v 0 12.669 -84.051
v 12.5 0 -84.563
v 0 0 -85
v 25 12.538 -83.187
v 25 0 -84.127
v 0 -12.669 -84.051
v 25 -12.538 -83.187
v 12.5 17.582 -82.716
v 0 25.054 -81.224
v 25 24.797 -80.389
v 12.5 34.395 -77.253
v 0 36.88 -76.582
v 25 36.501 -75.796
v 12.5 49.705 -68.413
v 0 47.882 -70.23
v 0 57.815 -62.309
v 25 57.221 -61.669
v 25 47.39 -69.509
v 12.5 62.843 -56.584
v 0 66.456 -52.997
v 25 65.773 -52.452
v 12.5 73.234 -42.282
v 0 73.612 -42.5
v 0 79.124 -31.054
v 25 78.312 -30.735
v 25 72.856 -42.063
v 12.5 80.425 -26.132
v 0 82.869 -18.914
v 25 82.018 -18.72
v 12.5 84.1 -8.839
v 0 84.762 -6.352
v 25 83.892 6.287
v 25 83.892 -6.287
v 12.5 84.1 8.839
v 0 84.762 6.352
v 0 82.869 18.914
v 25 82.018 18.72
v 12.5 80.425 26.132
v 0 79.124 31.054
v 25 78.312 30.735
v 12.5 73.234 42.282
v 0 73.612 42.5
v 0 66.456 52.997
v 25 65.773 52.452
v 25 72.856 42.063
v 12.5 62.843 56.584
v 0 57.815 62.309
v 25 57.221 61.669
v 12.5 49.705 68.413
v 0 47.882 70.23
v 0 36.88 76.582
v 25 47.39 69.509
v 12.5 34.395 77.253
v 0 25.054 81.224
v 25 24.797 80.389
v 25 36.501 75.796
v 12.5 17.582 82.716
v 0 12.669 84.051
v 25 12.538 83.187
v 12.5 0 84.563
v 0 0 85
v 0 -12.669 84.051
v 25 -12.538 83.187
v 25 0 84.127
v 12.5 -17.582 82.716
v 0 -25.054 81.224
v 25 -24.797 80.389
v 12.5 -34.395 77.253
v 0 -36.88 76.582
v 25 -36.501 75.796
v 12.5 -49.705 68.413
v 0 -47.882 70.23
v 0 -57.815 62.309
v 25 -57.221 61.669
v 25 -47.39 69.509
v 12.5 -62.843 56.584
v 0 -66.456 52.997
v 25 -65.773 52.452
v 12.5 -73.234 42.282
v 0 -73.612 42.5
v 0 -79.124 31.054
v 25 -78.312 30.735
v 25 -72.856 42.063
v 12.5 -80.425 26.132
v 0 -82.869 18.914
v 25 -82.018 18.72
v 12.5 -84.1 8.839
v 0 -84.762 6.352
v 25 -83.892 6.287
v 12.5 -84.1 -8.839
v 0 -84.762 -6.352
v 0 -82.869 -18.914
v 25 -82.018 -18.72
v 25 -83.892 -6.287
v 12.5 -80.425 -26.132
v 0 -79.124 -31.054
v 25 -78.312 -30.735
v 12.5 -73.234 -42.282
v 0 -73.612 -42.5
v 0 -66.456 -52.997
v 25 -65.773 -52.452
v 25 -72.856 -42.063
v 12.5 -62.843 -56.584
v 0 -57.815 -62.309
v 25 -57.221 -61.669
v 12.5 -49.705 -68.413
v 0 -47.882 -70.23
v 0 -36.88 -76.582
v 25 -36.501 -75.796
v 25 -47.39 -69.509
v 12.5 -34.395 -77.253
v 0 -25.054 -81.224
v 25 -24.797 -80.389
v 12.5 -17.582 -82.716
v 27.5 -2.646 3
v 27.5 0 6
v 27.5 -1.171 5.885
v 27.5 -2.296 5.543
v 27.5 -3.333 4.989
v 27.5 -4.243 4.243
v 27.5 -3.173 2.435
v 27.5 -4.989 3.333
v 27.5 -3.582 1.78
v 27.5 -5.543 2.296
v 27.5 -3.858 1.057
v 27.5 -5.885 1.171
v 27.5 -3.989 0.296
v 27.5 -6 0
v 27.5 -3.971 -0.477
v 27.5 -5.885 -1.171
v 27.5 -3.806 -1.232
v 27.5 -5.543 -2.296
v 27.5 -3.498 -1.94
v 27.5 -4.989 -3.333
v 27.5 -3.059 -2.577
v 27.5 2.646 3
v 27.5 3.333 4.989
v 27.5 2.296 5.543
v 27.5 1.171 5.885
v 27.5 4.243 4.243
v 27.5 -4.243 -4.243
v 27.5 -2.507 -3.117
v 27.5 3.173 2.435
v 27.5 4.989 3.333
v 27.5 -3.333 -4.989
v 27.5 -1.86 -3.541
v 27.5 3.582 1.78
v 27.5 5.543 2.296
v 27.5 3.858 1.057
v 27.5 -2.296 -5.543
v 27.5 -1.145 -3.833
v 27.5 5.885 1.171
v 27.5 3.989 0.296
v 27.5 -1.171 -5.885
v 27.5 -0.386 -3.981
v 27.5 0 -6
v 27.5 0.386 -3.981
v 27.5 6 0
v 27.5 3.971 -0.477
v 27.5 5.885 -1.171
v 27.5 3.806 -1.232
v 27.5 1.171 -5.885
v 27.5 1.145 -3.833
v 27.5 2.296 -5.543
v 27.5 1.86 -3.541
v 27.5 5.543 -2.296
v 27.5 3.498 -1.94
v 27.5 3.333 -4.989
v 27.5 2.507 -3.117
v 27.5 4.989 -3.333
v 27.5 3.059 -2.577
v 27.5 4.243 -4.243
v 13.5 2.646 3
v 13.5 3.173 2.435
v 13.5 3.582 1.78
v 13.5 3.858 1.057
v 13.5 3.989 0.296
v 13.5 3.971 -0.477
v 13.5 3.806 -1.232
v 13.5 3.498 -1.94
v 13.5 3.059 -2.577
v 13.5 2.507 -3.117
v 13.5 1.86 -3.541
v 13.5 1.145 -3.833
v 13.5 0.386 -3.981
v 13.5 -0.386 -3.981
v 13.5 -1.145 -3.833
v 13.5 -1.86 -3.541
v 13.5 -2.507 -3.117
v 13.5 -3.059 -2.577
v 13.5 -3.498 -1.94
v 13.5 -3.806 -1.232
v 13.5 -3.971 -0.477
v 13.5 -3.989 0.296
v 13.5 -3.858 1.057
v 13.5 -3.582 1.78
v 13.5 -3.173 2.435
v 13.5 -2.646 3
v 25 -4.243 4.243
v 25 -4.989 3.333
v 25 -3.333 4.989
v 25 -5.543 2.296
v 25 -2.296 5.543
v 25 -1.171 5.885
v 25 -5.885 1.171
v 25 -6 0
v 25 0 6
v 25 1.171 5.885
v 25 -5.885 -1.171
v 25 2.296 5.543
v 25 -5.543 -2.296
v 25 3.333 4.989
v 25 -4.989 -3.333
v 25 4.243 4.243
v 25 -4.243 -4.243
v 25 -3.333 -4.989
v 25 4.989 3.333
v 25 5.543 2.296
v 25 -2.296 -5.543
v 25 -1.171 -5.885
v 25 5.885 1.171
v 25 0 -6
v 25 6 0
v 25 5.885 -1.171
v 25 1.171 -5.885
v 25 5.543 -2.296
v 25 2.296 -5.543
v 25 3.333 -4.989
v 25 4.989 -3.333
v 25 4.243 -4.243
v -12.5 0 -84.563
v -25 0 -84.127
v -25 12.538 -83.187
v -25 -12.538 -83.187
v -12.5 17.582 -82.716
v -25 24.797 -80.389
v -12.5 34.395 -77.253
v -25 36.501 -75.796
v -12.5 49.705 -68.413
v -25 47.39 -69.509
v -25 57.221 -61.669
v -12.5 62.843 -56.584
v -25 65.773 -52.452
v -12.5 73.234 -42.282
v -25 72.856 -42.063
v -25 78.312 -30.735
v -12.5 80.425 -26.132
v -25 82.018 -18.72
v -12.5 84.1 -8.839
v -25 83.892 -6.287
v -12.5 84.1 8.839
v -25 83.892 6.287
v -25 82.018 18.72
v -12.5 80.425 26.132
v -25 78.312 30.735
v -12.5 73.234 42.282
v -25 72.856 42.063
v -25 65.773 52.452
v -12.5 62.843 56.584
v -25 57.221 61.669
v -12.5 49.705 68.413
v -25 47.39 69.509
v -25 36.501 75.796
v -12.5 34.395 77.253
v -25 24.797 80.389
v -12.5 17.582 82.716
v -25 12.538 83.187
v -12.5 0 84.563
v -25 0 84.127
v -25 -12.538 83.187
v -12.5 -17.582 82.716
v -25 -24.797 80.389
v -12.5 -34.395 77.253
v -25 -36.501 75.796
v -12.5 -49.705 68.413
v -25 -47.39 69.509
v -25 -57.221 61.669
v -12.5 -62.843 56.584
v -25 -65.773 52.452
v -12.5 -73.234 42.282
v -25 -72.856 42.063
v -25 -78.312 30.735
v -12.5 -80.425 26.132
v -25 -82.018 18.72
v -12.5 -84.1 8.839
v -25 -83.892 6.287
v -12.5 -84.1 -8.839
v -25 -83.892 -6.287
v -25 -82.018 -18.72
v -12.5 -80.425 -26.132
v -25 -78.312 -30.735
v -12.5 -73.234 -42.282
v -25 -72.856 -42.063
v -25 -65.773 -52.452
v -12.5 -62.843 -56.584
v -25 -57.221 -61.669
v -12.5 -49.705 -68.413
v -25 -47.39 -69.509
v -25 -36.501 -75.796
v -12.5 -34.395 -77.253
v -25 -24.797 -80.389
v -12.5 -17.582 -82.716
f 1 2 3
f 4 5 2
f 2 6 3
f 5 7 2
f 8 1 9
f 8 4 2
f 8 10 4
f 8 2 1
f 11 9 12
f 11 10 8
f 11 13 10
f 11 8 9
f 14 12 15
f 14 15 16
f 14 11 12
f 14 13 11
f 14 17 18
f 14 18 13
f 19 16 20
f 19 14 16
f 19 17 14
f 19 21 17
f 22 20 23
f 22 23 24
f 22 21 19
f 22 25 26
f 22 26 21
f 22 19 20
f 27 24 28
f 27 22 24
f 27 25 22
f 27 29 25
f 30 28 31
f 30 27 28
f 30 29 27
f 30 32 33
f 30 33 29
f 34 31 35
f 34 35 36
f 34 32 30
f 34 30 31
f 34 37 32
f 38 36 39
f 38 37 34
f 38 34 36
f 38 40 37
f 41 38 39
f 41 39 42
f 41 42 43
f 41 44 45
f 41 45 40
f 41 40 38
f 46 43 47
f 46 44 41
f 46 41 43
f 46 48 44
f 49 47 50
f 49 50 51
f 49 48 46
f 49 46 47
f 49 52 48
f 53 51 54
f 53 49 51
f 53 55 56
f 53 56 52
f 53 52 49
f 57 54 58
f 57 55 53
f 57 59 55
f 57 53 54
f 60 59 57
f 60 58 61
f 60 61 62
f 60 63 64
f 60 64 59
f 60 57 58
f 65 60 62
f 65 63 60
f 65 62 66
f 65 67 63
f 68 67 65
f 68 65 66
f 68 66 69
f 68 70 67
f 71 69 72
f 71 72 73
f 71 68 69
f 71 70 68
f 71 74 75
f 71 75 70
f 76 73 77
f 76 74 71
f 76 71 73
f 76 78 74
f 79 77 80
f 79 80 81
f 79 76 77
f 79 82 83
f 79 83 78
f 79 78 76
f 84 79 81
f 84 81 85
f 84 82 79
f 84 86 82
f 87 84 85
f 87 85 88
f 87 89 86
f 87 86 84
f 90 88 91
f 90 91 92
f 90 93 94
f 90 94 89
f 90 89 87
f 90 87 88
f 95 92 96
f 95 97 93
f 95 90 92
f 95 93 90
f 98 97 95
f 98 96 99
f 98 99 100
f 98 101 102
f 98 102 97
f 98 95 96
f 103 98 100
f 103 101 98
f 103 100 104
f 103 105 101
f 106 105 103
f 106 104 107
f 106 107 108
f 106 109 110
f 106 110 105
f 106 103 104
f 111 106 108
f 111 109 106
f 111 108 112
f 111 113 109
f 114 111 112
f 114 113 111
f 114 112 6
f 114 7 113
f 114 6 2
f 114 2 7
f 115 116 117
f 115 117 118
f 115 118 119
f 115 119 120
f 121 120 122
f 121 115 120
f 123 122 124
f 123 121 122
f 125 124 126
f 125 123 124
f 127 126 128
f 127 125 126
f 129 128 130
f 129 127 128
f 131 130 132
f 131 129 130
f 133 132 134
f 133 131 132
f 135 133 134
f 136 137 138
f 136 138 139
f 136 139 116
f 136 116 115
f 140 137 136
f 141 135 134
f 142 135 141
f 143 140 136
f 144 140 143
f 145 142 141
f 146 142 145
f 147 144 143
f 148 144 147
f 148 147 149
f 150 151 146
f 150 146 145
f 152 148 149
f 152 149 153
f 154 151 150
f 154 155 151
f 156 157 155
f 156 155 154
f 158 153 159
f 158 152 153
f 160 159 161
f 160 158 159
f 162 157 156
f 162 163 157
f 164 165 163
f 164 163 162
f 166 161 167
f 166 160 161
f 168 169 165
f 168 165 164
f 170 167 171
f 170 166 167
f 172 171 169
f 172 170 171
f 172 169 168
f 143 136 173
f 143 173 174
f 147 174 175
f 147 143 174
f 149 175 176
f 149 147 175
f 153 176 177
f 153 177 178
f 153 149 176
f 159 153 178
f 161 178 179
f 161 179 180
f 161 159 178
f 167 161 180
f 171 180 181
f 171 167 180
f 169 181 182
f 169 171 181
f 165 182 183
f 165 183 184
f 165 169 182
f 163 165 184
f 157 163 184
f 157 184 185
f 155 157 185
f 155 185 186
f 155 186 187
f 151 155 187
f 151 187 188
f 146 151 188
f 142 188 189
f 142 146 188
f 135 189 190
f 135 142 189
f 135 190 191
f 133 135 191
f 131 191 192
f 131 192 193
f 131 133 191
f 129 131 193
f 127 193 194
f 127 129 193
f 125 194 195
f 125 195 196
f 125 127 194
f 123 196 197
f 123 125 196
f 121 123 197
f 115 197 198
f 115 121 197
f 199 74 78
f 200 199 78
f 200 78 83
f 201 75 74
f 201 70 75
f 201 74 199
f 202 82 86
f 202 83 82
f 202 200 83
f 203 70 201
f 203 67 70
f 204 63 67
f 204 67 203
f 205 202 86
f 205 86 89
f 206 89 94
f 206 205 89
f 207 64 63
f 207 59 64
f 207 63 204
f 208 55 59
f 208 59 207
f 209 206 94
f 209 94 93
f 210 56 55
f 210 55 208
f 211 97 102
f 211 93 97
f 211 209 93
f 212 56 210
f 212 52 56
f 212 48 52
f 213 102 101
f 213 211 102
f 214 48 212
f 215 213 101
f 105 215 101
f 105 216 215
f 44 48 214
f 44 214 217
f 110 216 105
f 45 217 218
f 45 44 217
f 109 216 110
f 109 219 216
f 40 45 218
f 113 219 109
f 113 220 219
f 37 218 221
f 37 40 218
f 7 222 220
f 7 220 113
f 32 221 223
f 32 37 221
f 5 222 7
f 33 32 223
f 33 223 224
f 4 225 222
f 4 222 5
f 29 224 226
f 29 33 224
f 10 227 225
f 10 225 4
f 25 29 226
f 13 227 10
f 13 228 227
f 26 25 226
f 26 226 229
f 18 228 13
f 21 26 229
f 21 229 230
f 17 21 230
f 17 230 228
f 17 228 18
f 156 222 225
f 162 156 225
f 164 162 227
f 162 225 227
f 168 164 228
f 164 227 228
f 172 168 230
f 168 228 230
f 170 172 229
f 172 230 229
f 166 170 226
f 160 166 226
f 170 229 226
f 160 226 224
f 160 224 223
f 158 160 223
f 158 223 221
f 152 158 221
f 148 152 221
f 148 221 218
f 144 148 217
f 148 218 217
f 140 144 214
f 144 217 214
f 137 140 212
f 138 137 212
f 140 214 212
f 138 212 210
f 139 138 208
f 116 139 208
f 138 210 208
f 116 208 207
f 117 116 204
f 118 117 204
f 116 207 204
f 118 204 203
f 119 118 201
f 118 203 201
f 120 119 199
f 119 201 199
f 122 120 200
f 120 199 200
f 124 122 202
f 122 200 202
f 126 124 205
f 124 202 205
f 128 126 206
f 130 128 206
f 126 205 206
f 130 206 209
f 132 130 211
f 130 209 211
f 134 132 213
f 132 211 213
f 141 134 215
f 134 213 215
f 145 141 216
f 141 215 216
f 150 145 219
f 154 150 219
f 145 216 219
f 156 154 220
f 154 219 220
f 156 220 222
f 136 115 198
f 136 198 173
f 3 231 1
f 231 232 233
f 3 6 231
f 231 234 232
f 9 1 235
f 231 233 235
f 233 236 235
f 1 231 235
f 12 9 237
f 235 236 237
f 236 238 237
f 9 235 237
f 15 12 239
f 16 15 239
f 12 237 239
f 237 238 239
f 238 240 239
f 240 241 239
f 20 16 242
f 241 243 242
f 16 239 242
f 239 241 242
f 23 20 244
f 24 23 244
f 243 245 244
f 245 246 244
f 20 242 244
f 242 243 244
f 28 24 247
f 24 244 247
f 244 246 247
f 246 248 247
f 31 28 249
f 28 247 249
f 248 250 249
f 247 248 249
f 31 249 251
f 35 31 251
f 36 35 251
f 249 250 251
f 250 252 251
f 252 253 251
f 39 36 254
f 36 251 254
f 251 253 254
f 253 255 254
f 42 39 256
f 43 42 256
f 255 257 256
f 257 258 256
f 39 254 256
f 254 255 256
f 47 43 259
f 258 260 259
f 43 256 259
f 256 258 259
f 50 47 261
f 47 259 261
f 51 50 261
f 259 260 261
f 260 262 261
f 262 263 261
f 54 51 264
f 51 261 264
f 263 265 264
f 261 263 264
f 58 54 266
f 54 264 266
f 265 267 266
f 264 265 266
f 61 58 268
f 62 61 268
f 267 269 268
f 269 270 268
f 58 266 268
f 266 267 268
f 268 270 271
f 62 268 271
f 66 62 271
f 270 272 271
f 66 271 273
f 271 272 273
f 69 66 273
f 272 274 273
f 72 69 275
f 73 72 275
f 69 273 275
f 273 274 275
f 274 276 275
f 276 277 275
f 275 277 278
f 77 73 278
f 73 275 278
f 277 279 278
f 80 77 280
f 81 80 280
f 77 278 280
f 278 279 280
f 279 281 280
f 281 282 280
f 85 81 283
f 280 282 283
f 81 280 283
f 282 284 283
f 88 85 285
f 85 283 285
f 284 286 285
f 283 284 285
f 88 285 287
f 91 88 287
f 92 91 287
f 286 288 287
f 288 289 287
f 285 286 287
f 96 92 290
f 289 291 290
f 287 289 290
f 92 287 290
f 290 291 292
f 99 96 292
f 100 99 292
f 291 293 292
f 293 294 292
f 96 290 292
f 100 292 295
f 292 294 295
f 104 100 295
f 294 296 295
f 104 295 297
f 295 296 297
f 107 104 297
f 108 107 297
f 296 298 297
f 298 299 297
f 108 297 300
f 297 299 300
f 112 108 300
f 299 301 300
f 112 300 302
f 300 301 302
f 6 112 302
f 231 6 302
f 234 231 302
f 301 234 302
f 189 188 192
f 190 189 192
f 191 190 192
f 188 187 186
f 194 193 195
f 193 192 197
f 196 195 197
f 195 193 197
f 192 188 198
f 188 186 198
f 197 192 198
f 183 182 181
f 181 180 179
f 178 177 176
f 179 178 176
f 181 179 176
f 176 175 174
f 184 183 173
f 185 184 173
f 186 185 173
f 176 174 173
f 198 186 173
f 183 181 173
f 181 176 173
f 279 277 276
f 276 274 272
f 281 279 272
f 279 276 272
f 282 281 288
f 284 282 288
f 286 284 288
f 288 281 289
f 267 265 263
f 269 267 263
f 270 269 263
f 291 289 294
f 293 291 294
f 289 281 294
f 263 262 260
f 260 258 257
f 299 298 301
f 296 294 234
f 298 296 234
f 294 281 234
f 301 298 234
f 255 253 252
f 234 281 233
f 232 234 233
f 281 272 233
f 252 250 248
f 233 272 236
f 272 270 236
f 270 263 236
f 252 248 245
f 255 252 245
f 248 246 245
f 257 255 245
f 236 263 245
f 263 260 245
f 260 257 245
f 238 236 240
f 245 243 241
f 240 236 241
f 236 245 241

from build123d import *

# Parameters (mm, degrees)
SKETCH1_R                     = 85
BOSS_EXTRUDE1_DEPTH           = 25
BOSS_EXTRUDE1_TAPER           = 2
BOSS_EXTRUDE1_OTHER_WAY_DEPTH = 25
BOSS_EXTRUDE1_OTHER_WAY_TAPER = 2
SKETCH2_R                     = 6
BOSS_EXTRUDE2_DEPTH           = 2.5
CUT_EXTRUDE1_DEPTH            = 14


with BuildPart() as part:
    # Sketch1 → Boss-Extrude1 (new body)
    with BuildSketch(Plane(origin=(0, 0, 0), x_dir=(0, 0, -1), z_dir=(1, 0, 0))):
        Circle(SKETCH1_R)
    extrude(amount=BOSS_EXTRUDE1_DEPTH, taper=BOSS_EXTRUDE1_TAPER)

    # Sketch1 → Boss-Extrude1 other way (add)
    with BuildSketch(Plane(origin=(0, 0, 0), x_dir=(0, 0, -1), z_dir=(1, 0, 0))):
        Circle(SKETCH1_R)
    extrude(amount=-BOSS_EXTRUDE1_OTHER_WAY_DEPTH, taper=BOSS_EXTRUDE1_OTHER_WAY_TAPER)

    # Sketch2 → Boss-Extrude2 (add)
    with BuildSketch(Plane(origin=(25, 0, 0), x_dir=(0, 0, -1), z_dir=(1, 0, 0))):
        Circle(SKETCH2_R)
    extrude(amount=BOSS_EXTRUDE2_DEPTH)

    # Sketch3 → Cut-Extrude1 (cut)
    with BuildSketch(Plane(origin=(27.5, 0, 0), x_dir=(0, 0, -1), z_dir=(1, 0, 0))):
        with BuildLine():
            Line((-3, -2.645751311), (-3, 2.645751311))
            ThreePointArc((-3, 2.645751311), (4, 0), (-3, -2.645751311))
        make_face()
    extrude(amount=-CUT_EXTRUDE1_DEPTH, mode=Mode.SUBTRACT)


solid = part.part
